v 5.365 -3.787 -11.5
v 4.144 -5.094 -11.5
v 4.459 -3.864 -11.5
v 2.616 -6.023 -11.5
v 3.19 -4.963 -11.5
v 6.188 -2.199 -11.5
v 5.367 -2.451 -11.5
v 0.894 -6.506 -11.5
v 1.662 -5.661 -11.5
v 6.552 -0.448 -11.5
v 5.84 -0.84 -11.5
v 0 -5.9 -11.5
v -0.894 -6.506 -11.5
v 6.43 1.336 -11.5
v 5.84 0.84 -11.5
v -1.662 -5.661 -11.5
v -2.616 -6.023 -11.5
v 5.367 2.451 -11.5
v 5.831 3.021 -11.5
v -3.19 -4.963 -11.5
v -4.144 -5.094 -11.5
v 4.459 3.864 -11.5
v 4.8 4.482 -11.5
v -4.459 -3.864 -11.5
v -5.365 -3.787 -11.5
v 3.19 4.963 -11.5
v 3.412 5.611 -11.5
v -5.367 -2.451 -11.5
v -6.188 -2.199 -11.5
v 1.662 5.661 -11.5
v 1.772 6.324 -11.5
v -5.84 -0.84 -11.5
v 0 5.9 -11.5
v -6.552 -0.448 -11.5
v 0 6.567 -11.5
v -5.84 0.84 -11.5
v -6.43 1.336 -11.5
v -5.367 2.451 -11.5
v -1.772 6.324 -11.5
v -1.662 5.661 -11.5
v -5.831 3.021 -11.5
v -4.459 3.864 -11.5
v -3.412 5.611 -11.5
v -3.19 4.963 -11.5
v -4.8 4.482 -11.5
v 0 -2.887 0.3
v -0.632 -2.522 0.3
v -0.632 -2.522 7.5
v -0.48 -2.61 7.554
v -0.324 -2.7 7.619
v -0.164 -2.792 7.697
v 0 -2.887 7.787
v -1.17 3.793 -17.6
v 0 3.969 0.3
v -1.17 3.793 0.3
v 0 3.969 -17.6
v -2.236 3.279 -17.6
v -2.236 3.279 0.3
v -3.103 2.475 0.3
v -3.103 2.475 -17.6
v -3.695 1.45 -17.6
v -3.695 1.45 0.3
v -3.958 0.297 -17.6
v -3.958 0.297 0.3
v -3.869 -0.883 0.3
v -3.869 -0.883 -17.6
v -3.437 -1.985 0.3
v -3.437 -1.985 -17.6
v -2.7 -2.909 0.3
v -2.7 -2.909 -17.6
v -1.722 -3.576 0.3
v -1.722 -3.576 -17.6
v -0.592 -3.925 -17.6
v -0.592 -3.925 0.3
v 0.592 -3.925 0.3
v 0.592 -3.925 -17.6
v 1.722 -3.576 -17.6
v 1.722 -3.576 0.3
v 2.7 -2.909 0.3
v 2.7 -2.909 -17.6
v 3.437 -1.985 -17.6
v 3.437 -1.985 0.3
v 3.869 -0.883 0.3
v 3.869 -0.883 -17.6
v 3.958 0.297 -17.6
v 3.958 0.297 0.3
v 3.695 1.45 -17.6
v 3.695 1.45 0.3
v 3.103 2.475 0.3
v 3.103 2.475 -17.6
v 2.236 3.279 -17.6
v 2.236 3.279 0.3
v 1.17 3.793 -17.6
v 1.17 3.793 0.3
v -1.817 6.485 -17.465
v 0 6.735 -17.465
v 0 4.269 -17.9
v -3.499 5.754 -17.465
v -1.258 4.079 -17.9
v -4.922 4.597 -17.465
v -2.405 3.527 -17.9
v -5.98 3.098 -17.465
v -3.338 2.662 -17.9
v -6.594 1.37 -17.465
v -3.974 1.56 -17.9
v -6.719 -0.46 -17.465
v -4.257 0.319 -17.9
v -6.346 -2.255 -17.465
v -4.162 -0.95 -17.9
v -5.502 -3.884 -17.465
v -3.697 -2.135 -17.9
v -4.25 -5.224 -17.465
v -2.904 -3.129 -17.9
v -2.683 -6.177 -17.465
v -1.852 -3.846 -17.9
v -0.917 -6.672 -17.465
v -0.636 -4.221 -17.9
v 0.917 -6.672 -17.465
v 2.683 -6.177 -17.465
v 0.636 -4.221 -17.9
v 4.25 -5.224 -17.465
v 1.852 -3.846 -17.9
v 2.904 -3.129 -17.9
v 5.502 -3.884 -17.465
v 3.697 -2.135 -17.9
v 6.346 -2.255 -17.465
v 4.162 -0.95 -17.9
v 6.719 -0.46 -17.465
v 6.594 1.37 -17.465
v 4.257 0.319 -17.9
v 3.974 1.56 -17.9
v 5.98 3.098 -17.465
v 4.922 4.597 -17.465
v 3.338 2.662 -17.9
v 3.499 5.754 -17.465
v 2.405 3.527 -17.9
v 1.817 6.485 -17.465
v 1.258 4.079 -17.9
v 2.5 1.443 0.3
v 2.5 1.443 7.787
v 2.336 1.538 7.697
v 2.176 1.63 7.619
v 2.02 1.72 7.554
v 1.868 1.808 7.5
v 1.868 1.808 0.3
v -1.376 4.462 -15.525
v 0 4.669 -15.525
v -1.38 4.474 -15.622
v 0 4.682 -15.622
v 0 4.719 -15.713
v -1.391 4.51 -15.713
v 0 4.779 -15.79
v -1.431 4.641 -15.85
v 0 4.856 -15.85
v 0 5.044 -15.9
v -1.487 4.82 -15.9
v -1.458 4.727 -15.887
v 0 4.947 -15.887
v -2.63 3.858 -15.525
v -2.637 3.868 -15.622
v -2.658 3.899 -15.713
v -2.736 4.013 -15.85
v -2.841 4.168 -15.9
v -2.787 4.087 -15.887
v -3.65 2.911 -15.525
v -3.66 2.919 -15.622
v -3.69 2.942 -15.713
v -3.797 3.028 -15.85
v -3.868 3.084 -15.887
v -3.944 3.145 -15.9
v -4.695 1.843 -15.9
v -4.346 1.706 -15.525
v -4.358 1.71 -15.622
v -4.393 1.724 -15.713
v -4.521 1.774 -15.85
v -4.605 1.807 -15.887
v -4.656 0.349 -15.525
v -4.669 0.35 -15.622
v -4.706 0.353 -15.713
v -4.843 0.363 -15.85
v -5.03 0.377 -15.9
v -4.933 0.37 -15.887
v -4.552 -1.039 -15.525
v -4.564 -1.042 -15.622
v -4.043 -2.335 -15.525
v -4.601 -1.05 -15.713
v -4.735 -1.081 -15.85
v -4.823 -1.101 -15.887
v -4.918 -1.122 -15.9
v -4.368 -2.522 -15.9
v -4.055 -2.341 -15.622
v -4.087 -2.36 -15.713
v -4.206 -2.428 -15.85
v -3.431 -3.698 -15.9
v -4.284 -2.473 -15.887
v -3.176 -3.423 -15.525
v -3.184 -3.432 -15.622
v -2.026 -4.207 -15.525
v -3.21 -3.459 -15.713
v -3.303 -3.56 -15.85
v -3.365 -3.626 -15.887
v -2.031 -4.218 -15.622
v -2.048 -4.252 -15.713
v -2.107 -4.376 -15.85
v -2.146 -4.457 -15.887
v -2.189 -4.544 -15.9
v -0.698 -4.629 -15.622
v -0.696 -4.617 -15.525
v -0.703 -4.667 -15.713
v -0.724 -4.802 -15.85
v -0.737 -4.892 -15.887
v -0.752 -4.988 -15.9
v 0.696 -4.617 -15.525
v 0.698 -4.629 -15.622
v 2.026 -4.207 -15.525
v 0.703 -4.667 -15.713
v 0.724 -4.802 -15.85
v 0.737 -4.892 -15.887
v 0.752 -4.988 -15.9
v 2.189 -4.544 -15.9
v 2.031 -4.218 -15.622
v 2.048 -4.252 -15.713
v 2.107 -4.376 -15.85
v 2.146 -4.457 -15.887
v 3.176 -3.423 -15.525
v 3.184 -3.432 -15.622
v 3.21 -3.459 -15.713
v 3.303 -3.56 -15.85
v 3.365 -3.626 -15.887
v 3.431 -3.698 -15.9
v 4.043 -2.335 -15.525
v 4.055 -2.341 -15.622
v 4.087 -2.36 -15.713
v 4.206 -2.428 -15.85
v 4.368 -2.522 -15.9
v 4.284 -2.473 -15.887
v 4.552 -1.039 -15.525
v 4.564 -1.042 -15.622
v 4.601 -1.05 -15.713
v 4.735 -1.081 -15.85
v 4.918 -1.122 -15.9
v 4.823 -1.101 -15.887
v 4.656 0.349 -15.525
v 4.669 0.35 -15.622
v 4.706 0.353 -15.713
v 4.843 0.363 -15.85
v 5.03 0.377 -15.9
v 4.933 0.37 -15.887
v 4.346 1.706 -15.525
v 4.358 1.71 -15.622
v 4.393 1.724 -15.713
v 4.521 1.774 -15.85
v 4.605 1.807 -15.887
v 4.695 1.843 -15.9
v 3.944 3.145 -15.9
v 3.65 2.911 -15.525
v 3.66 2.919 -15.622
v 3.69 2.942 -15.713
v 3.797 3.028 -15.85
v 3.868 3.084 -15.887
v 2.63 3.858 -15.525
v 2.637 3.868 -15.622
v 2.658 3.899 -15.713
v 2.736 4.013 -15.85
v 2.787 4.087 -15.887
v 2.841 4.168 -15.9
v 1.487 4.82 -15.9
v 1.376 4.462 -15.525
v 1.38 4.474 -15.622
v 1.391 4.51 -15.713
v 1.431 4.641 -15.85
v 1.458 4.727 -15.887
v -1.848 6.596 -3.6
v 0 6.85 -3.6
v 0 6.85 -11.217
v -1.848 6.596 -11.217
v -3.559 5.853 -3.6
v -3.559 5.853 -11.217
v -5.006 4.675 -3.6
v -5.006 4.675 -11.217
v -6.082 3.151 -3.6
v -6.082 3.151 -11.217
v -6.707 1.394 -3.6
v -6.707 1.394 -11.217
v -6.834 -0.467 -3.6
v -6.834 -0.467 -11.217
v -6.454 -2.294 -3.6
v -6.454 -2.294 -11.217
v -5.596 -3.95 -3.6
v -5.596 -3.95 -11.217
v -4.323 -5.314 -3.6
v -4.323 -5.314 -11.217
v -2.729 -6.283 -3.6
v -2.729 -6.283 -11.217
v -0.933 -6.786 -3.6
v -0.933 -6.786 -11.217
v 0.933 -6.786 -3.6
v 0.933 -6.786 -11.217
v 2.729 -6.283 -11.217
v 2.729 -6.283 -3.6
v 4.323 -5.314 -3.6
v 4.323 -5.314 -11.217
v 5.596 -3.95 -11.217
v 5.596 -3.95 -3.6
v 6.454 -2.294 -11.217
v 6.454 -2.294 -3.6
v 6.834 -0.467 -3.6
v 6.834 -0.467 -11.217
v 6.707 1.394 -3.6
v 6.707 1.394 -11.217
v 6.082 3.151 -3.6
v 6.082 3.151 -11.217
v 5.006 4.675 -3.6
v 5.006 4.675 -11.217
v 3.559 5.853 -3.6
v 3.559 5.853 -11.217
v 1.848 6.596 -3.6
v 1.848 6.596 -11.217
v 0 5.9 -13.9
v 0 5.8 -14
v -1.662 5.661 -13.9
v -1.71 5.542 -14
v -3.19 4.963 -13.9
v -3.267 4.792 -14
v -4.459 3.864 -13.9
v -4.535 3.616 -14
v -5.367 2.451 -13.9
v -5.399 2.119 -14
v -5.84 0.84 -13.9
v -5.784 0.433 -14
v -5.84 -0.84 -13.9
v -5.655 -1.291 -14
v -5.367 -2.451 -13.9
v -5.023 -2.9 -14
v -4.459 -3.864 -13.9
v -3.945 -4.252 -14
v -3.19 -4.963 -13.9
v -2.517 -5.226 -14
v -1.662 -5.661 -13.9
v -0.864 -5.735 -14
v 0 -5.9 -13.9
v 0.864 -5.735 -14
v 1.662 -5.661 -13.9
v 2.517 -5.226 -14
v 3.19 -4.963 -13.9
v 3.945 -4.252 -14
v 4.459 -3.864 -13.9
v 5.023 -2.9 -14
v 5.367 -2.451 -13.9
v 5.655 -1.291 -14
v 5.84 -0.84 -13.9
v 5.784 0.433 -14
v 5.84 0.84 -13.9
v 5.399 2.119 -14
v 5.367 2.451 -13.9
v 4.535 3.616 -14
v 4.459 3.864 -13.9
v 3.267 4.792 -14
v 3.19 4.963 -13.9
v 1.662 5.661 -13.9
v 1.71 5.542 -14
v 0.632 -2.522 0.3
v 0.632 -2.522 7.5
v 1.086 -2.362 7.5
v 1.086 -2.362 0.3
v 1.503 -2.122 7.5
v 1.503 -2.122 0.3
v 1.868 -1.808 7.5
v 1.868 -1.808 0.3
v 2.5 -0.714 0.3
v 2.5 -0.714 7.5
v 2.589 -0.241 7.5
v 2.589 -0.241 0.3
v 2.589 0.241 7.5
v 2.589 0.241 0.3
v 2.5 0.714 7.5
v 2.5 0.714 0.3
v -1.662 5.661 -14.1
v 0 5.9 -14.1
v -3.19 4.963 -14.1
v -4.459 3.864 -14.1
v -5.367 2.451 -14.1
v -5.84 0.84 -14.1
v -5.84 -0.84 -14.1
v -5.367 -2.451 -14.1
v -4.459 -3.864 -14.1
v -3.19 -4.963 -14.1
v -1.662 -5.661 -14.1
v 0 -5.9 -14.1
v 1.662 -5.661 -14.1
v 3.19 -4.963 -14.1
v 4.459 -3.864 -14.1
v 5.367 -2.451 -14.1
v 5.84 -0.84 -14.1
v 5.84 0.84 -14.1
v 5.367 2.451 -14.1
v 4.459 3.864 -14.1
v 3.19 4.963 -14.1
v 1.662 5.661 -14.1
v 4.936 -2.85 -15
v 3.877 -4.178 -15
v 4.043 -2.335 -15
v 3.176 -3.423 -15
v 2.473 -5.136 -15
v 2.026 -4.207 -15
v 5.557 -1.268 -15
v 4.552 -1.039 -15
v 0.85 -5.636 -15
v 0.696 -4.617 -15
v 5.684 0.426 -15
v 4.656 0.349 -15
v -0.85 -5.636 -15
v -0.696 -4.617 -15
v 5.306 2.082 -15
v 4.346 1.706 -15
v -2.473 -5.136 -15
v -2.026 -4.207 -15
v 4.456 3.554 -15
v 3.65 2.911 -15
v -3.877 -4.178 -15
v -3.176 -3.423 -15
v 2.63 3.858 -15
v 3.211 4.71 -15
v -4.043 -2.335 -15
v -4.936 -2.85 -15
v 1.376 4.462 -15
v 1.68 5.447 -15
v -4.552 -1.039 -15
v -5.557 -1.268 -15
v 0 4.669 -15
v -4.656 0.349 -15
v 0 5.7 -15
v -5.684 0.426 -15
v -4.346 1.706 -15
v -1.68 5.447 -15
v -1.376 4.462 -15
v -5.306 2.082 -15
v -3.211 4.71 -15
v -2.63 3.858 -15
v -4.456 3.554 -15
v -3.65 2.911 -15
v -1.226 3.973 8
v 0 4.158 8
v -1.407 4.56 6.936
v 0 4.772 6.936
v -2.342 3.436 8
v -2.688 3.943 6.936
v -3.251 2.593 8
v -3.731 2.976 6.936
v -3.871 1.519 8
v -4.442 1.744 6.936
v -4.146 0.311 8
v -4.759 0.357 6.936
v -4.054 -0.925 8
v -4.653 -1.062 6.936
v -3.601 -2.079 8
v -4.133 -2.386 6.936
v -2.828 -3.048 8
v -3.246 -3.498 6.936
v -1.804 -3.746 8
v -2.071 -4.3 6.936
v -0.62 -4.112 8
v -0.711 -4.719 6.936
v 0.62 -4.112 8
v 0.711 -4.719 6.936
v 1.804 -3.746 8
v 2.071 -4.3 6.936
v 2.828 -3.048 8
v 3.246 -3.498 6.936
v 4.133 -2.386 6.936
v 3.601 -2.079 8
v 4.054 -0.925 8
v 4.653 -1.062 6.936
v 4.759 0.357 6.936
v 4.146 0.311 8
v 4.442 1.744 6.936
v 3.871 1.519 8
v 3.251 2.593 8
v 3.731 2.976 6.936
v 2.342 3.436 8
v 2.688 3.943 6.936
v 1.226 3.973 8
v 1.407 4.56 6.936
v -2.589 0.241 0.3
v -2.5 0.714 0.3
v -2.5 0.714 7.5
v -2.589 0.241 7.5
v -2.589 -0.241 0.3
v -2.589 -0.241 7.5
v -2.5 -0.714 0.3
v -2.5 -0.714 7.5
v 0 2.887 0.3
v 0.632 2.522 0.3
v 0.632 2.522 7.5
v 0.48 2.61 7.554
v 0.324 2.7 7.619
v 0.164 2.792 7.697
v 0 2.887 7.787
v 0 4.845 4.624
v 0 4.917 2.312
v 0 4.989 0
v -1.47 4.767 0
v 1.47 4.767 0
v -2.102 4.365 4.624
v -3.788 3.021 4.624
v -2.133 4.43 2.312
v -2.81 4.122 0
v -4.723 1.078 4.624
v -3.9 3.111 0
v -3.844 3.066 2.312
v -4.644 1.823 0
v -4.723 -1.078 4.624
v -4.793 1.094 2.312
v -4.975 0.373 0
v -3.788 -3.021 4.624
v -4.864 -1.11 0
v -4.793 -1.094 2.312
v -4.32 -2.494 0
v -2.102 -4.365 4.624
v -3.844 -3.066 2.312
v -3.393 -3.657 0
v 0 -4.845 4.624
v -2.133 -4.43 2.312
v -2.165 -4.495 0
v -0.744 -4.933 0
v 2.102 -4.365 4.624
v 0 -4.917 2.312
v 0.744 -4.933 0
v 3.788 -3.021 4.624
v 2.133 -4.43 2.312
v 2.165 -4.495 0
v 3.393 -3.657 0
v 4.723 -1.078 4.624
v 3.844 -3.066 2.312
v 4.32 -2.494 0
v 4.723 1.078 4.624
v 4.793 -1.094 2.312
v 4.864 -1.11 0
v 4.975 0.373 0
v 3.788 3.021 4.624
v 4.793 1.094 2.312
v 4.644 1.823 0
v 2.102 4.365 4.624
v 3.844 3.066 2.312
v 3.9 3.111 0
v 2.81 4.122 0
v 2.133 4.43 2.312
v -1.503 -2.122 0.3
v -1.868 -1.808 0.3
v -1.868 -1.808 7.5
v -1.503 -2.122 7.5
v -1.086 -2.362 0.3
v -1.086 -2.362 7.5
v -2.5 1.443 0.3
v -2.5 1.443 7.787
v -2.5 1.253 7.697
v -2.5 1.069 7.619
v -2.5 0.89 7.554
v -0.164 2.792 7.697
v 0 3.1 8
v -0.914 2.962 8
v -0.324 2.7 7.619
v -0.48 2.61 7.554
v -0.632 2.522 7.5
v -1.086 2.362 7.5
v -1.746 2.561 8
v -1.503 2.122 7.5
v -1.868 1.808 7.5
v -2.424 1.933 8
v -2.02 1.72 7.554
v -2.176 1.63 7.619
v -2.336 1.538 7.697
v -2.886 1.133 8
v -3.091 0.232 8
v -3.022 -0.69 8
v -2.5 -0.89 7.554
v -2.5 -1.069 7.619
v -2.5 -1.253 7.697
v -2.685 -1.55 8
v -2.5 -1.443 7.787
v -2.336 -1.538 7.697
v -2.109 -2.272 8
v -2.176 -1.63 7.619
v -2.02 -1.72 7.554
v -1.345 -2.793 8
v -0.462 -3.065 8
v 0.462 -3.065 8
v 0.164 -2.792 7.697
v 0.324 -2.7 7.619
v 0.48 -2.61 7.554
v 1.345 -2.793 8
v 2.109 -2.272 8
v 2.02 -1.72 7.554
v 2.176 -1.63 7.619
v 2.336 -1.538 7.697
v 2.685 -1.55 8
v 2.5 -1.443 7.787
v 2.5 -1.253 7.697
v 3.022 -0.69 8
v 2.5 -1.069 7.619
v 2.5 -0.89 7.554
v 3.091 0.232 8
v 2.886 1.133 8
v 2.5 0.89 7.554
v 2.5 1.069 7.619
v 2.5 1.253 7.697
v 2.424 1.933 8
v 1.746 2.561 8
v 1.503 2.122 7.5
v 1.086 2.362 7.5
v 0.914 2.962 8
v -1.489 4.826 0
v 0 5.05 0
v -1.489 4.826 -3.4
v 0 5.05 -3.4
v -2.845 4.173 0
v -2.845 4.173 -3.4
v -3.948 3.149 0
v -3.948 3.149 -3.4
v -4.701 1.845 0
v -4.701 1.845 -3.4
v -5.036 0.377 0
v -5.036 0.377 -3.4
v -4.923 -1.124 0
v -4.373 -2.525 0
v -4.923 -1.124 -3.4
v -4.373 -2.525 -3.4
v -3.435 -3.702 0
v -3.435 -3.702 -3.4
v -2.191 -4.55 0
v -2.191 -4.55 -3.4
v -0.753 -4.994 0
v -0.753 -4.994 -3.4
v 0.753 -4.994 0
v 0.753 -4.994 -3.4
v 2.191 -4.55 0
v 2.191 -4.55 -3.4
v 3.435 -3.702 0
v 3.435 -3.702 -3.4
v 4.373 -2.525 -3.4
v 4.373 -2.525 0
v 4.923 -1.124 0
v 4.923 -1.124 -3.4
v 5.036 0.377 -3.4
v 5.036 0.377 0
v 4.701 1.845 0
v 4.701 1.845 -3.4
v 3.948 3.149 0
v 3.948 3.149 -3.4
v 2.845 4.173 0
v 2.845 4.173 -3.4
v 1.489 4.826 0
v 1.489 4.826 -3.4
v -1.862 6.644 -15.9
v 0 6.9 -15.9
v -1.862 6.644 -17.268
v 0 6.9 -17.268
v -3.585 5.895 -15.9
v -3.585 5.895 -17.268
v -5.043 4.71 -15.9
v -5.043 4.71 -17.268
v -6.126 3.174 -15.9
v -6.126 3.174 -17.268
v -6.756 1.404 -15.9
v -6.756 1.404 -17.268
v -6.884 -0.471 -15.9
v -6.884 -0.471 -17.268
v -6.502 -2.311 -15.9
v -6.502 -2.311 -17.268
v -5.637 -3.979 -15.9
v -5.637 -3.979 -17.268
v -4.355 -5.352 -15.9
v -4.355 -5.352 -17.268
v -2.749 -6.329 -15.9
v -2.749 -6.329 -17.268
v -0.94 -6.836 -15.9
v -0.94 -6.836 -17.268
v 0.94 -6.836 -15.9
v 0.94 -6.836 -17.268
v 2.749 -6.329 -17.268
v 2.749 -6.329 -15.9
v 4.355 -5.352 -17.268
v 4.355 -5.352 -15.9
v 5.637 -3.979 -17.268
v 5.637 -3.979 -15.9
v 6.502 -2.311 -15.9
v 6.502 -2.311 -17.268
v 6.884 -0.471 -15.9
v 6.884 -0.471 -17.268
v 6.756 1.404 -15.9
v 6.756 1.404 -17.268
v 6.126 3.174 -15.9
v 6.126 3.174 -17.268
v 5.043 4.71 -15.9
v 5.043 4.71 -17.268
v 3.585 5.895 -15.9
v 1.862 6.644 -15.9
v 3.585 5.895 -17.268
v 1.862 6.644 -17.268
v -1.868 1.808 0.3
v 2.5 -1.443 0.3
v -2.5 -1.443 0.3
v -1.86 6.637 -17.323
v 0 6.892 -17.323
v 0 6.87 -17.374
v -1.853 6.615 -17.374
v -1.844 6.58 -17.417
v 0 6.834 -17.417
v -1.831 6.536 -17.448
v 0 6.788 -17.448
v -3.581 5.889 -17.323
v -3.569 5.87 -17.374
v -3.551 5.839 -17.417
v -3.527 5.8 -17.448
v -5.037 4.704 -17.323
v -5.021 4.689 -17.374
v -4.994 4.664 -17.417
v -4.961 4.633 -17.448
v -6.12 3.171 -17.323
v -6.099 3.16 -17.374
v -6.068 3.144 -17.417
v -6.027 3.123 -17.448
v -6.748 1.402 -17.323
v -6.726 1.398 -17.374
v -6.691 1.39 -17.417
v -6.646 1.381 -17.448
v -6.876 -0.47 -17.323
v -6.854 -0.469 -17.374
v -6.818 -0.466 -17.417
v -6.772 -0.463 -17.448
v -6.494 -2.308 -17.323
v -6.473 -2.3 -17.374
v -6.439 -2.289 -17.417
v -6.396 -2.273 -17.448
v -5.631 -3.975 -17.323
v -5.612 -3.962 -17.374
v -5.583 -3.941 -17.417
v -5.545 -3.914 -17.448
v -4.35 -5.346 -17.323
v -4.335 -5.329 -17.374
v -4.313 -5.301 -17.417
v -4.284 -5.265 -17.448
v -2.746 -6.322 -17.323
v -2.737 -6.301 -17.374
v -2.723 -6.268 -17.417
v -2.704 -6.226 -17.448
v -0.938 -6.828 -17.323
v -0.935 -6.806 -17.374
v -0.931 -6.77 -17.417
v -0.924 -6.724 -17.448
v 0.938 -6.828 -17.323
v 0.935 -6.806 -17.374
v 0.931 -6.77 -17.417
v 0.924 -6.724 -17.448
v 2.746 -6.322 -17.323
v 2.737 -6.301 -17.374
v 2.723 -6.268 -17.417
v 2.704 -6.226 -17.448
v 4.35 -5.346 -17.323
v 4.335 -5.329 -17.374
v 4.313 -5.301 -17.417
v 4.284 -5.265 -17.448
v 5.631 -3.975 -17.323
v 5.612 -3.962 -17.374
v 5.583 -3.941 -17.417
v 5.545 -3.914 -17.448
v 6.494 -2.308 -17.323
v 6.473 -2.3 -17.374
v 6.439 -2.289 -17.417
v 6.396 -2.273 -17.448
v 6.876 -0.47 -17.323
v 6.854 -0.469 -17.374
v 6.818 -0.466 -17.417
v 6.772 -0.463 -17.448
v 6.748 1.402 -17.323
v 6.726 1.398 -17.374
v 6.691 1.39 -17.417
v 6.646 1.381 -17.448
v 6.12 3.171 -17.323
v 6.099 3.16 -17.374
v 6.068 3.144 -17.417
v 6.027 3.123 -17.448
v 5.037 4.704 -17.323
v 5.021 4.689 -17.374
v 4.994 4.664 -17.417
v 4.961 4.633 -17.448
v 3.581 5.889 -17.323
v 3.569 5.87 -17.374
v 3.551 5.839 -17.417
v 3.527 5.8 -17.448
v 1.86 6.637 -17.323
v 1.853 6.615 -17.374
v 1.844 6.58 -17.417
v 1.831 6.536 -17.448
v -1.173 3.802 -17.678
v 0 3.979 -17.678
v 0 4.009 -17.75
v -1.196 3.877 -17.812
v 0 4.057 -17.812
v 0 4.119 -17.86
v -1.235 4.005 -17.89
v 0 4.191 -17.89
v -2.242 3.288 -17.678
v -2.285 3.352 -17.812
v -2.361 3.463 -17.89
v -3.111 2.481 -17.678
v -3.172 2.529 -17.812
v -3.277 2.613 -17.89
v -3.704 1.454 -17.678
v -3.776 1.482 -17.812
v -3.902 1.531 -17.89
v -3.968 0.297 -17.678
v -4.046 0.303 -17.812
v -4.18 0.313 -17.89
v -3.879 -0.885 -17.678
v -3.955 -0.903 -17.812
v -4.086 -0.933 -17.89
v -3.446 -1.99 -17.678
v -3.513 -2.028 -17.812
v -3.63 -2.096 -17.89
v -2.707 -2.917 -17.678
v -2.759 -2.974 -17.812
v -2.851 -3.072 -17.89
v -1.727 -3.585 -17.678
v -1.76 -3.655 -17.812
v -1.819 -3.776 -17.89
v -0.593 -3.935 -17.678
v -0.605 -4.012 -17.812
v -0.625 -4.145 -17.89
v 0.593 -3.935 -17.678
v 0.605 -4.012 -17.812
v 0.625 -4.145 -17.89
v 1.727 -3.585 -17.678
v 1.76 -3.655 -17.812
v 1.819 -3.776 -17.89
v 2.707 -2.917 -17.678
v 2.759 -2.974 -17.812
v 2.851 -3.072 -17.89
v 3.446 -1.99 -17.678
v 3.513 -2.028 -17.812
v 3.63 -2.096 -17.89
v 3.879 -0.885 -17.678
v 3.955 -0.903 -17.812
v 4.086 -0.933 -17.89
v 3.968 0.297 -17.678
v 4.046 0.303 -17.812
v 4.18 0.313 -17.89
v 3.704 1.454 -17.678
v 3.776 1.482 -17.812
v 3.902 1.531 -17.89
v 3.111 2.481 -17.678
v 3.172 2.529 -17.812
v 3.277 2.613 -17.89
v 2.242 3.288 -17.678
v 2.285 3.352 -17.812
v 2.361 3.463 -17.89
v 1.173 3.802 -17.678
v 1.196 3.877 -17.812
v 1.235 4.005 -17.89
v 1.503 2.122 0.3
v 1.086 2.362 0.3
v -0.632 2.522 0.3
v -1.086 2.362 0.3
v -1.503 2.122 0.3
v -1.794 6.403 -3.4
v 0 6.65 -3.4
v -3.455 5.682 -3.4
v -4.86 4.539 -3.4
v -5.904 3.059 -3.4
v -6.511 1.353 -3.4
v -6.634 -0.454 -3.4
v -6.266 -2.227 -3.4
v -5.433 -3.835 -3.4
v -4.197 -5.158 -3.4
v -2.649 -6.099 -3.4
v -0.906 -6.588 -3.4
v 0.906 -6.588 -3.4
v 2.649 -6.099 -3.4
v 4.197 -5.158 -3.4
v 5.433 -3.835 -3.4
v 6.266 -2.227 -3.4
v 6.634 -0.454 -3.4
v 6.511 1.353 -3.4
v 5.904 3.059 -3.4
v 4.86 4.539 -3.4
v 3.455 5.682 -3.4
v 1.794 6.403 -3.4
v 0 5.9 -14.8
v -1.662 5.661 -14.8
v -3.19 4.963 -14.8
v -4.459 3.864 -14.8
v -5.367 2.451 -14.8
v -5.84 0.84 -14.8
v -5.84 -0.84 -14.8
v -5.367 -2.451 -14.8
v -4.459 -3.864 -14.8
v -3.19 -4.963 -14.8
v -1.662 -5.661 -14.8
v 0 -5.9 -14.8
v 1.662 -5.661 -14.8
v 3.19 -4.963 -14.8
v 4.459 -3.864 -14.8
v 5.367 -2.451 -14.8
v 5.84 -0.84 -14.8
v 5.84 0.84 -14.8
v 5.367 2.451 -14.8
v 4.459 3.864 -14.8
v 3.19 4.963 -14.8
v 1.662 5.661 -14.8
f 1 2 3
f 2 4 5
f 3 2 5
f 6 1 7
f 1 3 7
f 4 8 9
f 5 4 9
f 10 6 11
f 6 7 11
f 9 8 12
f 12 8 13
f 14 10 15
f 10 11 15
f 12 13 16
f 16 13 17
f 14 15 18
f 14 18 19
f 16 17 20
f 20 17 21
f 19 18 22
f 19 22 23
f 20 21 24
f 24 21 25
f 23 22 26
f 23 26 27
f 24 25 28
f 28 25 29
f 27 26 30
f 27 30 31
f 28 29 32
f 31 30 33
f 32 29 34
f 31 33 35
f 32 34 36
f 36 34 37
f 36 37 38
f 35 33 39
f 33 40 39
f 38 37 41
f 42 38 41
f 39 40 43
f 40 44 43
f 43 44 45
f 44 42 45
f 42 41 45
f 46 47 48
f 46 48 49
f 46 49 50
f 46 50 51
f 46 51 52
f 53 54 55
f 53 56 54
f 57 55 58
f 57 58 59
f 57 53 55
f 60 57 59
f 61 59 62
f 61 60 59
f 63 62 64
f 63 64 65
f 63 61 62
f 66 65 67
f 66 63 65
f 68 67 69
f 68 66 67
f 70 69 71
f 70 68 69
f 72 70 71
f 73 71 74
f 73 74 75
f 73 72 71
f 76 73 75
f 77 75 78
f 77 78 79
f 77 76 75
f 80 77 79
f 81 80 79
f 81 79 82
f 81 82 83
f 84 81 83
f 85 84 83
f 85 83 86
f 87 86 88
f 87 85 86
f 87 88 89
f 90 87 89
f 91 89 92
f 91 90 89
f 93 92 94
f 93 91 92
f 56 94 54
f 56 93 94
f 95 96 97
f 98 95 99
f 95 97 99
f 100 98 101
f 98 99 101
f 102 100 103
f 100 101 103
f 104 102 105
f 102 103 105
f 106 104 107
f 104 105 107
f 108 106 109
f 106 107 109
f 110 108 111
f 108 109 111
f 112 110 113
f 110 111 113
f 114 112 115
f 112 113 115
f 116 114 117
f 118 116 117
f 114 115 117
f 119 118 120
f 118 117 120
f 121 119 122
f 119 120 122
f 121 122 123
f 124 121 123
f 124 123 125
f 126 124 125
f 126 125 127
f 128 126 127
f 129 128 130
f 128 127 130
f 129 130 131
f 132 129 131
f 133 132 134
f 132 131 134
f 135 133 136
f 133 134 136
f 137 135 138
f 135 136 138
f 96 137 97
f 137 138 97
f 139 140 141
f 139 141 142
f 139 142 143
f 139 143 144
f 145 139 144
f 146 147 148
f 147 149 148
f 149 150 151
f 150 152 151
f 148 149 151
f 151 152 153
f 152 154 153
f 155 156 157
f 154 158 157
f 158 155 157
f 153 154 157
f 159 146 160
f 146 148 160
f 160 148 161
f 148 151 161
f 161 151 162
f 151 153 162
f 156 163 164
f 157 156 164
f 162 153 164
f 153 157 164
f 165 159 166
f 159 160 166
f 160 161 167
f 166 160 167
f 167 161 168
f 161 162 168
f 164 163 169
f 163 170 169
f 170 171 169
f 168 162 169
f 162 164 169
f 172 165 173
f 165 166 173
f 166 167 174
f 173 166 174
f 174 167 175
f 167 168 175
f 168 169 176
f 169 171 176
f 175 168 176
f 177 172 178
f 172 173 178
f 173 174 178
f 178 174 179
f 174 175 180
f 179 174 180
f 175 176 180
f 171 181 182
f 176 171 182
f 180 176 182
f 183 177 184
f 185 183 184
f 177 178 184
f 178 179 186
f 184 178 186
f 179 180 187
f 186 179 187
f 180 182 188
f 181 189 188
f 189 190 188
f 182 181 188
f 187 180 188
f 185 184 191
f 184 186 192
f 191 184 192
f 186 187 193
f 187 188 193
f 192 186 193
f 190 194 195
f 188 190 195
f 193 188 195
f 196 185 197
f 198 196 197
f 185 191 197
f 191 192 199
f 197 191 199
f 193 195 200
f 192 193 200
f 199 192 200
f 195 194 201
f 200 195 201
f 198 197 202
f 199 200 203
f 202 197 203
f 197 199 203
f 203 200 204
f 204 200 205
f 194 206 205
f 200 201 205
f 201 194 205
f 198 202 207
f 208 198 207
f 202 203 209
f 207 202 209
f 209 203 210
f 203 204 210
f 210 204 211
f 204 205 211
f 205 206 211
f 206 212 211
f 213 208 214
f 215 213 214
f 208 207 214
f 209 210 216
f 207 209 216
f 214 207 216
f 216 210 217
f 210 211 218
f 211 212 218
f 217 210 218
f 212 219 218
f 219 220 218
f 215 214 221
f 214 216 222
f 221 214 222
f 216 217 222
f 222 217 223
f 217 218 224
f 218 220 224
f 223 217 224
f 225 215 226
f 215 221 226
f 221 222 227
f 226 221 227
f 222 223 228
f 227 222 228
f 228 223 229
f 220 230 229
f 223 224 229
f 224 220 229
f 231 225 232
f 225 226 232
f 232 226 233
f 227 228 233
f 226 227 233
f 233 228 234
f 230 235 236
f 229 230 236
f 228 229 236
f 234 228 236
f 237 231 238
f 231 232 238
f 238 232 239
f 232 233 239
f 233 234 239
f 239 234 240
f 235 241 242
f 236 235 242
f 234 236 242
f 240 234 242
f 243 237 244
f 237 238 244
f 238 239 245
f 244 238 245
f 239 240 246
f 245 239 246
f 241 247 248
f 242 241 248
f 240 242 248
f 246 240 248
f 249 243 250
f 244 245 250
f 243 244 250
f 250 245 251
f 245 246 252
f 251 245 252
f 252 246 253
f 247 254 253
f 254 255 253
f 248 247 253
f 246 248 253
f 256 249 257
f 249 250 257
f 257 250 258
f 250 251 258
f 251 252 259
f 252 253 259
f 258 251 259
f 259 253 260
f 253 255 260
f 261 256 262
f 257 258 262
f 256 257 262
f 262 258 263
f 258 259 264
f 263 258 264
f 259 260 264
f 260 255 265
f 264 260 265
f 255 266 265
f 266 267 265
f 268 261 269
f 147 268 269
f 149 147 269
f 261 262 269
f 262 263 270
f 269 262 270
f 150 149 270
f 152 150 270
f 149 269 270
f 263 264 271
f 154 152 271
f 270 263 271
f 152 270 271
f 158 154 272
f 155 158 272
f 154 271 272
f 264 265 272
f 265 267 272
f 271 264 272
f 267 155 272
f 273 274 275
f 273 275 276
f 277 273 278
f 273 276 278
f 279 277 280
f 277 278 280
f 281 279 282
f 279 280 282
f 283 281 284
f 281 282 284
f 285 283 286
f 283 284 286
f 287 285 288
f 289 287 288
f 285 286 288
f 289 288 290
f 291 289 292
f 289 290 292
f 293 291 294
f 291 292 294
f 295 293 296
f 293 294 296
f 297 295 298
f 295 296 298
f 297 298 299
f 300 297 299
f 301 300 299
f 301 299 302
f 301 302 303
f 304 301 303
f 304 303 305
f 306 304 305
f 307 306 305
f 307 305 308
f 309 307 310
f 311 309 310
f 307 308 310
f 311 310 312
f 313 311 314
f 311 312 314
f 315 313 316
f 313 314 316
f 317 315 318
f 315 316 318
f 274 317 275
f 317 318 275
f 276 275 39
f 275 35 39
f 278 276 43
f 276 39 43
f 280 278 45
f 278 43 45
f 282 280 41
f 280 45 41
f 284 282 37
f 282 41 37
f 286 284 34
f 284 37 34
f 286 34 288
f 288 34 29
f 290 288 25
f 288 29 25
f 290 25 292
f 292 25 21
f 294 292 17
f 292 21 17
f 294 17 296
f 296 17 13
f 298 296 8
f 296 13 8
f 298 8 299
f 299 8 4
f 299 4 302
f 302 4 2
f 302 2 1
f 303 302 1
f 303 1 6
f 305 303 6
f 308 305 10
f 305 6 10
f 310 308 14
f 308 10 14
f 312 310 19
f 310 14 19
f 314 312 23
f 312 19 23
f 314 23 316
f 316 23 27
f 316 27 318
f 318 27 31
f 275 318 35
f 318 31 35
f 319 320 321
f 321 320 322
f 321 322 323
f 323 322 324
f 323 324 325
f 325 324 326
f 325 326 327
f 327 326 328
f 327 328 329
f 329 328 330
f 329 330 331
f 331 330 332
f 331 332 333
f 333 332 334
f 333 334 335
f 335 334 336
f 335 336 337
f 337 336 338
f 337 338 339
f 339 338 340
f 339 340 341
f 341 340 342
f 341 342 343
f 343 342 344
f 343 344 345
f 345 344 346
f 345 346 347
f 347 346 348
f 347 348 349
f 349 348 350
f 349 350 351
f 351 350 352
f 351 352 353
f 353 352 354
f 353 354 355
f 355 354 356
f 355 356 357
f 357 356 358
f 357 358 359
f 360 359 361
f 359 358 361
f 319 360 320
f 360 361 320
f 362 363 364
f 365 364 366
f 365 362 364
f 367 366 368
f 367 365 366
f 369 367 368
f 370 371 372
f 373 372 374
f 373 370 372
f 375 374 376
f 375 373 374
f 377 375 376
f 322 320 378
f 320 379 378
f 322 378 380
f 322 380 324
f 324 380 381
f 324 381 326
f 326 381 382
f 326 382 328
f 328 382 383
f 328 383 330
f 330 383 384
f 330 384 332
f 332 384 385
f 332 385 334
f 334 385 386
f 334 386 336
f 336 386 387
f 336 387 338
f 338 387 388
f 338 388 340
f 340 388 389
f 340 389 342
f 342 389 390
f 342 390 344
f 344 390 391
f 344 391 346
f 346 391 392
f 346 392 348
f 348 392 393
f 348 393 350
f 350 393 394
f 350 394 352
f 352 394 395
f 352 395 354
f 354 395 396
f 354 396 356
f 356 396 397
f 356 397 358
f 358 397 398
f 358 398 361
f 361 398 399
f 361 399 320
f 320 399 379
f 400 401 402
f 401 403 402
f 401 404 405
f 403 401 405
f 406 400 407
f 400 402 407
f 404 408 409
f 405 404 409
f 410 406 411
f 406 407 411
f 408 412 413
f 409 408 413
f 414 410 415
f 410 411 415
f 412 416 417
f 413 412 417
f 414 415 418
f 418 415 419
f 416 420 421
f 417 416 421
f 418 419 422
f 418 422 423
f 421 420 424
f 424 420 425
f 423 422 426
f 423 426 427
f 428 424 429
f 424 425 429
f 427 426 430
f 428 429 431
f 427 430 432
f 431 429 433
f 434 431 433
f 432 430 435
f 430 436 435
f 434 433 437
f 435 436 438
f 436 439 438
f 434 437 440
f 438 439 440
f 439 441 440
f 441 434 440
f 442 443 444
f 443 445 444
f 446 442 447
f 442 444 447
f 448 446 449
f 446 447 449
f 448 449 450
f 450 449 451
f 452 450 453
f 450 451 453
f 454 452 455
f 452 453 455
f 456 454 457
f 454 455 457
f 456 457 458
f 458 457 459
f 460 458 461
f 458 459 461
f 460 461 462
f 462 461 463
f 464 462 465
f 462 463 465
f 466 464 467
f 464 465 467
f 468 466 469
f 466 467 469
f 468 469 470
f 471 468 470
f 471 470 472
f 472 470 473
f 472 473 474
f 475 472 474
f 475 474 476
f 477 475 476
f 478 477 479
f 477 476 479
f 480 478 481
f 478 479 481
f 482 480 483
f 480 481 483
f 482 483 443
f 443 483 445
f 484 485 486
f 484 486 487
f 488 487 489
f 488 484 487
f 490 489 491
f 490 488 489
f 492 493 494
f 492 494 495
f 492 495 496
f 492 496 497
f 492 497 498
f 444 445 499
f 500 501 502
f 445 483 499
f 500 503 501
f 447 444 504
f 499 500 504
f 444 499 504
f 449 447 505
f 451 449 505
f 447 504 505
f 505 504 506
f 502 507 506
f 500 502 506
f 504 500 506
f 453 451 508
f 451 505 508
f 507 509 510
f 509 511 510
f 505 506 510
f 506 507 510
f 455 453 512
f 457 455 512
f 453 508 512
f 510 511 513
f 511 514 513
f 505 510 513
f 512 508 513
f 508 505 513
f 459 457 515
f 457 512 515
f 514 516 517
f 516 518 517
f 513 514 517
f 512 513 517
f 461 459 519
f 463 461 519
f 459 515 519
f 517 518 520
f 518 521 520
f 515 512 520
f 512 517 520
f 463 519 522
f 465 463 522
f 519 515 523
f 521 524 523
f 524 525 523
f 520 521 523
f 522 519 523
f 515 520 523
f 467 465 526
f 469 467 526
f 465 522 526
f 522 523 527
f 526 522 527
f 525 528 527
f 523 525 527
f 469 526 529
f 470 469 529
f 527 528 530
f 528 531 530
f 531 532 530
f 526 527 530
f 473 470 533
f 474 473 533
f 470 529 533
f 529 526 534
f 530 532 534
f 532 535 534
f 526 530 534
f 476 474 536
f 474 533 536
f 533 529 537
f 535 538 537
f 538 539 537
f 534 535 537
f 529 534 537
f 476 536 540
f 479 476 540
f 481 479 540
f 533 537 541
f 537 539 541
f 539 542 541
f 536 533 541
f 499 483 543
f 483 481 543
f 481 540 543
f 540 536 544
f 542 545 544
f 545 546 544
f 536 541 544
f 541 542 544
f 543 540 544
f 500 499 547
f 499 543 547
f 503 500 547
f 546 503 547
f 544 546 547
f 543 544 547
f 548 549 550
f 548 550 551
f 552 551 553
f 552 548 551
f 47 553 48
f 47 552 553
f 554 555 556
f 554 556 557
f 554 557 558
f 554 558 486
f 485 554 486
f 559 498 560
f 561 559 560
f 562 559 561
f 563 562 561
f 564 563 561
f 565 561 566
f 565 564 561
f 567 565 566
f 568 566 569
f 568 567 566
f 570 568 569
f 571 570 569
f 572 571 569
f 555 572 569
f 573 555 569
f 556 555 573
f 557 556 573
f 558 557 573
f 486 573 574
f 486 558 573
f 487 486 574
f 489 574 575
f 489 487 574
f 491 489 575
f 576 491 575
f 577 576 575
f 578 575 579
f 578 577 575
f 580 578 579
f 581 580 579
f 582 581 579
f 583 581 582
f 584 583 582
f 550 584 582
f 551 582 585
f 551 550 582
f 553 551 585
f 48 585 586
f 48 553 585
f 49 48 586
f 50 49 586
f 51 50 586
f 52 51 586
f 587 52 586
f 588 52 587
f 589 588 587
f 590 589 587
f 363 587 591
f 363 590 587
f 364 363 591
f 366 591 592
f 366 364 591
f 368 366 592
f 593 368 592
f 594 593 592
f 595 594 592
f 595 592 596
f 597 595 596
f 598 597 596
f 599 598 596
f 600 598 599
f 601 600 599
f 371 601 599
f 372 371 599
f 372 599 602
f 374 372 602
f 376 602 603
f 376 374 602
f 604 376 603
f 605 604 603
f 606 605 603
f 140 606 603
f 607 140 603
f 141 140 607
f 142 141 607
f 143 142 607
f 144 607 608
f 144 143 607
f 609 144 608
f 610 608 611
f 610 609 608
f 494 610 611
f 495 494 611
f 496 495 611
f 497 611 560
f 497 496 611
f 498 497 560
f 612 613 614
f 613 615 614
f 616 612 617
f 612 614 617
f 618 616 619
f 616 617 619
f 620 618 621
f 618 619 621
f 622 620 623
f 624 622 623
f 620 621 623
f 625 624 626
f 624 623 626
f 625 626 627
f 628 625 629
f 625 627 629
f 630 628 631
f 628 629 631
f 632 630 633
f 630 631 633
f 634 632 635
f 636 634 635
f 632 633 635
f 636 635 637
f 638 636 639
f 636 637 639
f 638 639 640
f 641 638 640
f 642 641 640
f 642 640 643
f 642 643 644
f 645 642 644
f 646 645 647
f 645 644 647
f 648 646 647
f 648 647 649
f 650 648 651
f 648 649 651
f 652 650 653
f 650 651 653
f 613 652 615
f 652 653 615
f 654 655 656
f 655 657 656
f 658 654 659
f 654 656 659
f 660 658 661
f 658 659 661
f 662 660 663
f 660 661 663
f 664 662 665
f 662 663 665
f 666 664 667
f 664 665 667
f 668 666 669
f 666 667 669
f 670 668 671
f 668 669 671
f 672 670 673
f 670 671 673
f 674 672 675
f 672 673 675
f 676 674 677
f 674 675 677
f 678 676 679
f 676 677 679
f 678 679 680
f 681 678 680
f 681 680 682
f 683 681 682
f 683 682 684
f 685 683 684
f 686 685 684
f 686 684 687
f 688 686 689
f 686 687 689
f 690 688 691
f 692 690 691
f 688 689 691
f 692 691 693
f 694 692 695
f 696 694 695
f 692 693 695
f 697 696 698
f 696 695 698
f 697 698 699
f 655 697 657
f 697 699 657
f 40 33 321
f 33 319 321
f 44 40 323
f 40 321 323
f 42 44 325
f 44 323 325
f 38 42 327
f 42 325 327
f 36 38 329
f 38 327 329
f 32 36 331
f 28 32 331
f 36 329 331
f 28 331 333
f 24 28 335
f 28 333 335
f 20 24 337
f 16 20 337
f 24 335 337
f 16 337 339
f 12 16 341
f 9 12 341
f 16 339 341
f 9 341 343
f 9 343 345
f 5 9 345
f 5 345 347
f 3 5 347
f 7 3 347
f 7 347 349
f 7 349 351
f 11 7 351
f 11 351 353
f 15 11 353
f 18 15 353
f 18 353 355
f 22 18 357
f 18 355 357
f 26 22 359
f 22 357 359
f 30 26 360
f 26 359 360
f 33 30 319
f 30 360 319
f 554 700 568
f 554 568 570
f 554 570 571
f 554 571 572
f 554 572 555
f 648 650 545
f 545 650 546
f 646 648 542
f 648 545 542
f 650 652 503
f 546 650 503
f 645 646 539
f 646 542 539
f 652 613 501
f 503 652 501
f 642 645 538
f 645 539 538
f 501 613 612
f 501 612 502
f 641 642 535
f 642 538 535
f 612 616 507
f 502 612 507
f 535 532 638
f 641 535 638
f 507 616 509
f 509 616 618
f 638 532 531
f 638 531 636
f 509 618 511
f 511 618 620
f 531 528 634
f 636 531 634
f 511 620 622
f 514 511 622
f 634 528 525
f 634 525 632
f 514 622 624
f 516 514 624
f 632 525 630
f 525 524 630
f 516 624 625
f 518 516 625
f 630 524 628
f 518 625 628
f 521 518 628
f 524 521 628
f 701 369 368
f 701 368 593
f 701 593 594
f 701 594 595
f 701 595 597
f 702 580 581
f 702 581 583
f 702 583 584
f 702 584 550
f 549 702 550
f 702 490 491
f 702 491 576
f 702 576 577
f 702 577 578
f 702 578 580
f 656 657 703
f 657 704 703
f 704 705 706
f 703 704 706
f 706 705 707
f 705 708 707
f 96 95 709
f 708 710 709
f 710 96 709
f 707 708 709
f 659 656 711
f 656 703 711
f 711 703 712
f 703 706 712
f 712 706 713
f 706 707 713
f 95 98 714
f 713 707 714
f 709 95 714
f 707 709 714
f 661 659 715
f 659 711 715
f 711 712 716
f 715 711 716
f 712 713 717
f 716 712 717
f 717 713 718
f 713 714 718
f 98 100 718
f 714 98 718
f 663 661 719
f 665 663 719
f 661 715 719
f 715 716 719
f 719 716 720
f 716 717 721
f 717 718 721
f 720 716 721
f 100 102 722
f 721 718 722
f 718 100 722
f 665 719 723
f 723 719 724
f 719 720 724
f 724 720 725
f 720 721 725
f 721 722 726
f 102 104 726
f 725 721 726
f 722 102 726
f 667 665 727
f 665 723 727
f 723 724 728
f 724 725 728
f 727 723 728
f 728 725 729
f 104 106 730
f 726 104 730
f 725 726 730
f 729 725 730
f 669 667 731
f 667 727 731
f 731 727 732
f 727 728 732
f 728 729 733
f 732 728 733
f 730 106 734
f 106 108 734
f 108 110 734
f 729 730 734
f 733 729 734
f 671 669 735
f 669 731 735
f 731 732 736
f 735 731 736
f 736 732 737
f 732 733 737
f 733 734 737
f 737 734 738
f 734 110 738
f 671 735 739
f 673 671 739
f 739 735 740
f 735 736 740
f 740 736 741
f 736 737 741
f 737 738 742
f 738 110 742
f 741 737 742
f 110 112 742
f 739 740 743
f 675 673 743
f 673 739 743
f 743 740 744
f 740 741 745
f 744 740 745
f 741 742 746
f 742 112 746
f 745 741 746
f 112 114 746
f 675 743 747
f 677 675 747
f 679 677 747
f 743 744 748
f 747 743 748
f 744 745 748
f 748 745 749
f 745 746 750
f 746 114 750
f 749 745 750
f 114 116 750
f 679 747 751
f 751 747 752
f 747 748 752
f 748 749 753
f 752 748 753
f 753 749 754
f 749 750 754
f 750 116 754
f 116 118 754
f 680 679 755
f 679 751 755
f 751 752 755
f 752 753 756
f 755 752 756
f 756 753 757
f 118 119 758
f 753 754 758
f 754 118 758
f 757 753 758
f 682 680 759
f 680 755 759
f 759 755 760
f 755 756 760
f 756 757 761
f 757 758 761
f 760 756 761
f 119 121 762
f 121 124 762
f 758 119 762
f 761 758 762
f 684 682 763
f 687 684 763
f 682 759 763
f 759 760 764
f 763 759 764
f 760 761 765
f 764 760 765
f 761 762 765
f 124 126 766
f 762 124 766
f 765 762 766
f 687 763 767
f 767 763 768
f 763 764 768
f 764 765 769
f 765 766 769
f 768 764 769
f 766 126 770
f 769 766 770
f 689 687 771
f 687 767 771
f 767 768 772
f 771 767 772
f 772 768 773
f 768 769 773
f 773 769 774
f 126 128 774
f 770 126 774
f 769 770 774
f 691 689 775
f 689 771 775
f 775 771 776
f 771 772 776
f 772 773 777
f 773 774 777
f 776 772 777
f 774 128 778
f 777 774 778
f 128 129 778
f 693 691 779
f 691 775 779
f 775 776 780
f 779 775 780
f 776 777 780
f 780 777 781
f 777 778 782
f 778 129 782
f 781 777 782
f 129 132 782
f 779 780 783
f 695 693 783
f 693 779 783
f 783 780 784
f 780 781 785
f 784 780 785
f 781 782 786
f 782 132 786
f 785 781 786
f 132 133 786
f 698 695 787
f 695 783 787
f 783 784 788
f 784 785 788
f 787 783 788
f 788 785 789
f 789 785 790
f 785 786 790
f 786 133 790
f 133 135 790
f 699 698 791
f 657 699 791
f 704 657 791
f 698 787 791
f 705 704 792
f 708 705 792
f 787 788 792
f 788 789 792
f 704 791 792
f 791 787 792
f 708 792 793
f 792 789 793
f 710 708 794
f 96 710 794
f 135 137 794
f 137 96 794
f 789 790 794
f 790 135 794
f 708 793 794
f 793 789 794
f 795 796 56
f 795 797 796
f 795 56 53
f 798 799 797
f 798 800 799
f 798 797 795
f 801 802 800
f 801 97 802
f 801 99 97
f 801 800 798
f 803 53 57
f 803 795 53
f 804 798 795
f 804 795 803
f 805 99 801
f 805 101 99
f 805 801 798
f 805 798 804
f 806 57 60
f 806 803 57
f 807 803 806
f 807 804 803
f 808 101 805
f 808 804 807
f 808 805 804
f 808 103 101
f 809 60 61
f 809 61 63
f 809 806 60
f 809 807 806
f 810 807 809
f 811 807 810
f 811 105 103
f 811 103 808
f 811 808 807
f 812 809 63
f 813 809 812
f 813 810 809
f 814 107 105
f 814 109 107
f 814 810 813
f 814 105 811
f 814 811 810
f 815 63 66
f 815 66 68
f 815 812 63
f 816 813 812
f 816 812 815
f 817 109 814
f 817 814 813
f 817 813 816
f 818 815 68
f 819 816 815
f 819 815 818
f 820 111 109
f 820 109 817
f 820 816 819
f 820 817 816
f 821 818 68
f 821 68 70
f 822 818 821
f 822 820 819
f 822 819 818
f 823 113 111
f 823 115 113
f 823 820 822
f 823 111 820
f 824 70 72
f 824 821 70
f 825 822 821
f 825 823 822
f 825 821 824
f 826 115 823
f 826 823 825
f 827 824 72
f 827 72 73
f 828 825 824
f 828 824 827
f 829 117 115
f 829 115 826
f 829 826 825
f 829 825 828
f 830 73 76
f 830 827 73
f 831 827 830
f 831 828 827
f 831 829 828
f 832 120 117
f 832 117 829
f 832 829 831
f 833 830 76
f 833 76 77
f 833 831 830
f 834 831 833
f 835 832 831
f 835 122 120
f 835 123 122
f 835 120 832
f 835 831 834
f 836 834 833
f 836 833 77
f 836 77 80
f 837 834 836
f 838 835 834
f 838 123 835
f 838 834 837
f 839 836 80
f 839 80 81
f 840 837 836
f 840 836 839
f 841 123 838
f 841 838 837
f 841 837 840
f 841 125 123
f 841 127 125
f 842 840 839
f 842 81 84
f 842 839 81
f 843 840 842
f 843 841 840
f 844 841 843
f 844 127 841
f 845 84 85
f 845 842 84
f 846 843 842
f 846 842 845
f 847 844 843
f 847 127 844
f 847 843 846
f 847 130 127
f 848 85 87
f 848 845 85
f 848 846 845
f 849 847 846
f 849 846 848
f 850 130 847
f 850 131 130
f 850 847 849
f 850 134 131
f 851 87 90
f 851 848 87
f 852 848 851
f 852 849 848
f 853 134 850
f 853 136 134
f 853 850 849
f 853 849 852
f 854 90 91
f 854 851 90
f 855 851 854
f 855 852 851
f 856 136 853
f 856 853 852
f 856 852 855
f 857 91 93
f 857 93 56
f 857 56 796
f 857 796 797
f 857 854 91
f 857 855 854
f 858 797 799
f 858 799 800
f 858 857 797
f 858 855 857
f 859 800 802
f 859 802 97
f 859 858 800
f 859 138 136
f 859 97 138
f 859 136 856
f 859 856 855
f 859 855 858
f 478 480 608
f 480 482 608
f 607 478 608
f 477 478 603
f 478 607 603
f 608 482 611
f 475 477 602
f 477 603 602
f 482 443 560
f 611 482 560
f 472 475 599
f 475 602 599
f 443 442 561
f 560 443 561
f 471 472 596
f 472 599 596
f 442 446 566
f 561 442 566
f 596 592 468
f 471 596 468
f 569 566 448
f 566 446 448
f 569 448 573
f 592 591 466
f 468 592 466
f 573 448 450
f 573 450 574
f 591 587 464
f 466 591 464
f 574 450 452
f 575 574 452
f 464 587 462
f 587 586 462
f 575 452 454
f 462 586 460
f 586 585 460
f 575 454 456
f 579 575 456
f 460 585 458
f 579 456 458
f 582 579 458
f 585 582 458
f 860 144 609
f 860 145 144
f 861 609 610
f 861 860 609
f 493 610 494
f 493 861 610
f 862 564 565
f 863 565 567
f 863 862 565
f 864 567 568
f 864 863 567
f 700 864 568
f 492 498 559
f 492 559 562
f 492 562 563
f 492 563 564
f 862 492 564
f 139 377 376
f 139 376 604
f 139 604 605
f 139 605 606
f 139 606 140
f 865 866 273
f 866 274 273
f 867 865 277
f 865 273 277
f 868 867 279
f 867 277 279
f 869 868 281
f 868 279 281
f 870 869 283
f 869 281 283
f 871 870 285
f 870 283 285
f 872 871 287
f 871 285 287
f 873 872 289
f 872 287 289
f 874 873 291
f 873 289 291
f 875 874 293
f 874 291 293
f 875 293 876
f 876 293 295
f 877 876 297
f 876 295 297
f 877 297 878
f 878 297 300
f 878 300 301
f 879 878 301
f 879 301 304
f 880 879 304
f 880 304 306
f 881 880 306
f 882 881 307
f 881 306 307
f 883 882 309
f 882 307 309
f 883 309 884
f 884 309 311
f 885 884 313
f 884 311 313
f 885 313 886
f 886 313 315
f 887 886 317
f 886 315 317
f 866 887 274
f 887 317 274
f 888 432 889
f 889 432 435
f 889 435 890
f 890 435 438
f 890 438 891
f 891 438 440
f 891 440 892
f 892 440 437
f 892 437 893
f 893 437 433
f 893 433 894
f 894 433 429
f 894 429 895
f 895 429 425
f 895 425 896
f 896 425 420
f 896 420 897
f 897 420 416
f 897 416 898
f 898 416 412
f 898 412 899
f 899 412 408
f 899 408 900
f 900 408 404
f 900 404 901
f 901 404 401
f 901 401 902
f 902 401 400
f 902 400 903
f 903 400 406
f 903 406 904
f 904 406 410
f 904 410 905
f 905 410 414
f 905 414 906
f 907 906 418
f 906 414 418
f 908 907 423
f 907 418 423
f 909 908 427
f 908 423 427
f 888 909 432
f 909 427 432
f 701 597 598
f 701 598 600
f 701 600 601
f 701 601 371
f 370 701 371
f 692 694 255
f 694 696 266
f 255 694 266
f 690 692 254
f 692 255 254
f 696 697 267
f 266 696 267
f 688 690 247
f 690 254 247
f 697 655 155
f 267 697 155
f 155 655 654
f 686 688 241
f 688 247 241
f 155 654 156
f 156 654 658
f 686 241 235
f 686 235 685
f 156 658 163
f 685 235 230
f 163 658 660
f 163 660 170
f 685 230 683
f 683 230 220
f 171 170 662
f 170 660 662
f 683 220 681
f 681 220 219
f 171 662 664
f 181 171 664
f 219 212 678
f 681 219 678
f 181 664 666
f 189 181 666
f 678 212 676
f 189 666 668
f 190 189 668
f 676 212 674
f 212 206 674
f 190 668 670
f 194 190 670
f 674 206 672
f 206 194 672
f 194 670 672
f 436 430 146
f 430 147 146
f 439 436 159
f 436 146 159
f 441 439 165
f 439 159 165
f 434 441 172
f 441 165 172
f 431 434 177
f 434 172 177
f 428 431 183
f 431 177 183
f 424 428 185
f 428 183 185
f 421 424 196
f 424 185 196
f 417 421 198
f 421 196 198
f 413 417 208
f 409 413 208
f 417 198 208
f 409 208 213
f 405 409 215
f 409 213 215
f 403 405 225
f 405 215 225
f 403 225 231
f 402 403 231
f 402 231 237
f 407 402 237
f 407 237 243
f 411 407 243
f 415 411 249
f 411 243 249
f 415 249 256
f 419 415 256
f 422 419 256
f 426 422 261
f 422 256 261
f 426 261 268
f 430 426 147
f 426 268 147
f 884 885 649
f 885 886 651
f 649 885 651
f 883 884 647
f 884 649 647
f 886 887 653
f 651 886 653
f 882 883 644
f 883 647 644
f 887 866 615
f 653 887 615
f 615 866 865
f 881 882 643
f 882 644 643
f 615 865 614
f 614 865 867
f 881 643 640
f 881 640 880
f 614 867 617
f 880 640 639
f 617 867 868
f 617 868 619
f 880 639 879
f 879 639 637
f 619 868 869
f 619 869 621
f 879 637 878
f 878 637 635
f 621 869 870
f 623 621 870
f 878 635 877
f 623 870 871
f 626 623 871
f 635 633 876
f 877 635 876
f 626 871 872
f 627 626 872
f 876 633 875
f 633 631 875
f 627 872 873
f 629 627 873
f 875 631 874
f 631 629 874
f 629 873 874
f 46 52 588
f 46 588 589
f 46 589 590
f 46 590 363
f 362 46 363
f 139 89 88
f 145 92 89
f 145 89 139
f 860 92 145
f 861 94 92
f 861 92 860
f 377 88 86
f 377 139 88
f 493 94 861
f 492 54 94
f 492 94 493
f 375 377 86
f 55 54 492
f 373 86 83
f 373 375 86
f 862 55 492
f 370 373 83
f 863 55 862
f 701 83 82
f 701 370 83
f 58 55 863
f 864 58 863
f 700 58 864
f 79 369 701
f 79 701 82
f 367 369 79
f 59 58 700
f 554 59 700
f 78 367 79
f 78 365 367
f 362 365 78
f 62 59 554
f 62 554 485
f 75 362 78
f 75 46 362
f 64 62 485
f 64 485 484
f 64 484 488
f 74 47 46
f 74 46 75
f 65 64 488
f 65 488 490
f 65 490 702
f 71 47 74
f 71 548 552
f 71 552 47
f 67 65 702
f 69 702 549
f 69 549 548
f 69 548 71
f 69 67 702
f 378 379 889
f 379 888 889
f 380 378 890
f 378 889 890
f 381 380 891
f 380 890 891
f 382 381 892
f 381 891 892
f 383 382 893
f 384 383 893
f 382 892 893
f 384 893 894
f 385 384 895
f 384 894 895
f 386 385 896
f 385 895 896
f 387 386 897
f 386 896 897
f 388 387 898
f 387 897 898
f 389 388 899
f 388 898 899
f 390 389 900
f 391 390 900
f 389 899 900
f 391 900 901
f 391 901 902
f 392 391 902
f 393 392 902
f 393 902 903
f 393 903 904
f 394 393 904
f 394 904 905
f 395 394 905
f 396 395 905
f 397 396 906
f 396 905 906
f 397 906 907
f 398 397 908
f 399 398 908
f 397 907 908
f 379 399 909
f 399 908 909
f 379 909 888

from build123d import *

# Parameters (mm, degrees)
CUT_EXTRUDE1_DEPTH = 7.7


with BuildPart() as part:
    # Sketch1 → Revolve1 (revolve)
    with BuildSketch(Plane(origin=(0, 0, 0), x_dir=(0, 0, -1), z_dir=(1, 0, 0))):
        with BuildLine():
            Line((0, 0), (0, 6.85))
            Line((0, 6.85), (11.217157288, 6.85))
            Line((11.217157288, 6.85), (11.5, 6.567157288))
            Line((11.5, 6.567157288), (11.5, 5.9))
            Line((11.5, 5.9), (13.9, 5.9))
            Line((13.9, 5.9), (14, 5.8))
            Line((14, 5.8), (14.1, 5.9))
            Line((14.1, 5.9), (14.8, 5.9))
            Line((14.8, 5.9), (15, 5.7))
            Line((15, 5.7), (15, 4.669))
            Line((15, 4.669), (15.525, 4.669))
            ThreePointArc((15.525, 4.669), (15.790165043, 4.778834957), (15.9, 5.044))
            Line((15.9, 5.044), (15.9, 6.9))
            Line((15.9, 6.9), (17.268263788, 6.9))
            ThreePointArc((17.268263788, 6.9), (17.396821309, 6.853208889), (17.465225338, 6.734729636))
            Line((17.465225338, 6.734729636), (17.9, 4.269))
            Line((17.9, 4.269), (17.9, 0))
            Line((17.9, 0), (0, 0))
        make_face()
    revolve(axis=Axis((0, 0, -17.9), (0, 0, 1)))

    # Sketch2 → Revolve2 (revolve)
    with BuildSketch(Plane(origin=(0, 0, 0), x_dir=(0, 0, -1), z_dir=(1, 0, 0))):
        Polygon((-8, 0), (-8, 4.158121832), (-6.93615215, 4.772334675), (0, 4.988878168), (0, 0), align=None)
    revolve(axis=Axis((0, 0, 0), (0, 0, 1)))

    # Sketch3 → Cut-Revolve1 (revolve, cut)
    with BuildSketch(Plane(origin=(0, 0, 0), x_dir=(0, 0, -1), z_dir=(1, 0, 0))):
        Polygon((0, 6.85), (0, 5.05), (3.4, 5.05), (3.4, 6.65), (3.6, 6.85), align=None)
    revolve(axis=Axis((0, 0, -50), (0, 0, 1)), mode=Mode.SUBTRACT)

    # Sketch4 → Cut-Revolve2 (revolve, cut)
    with BuildSketch(Plane(origin=(0, 0, 0), x_dir=(0, 0, -1), z_dir=(1, 0, 0))):
        with BuildLine():
            Line((-8, 0), (-8, 3.1))
            Line((-8, 3.1), (-7.5, 2.6))
            Line((-7.5, 2.6), (-0.3, 2.6))
            Line((-0.3, 2.6), (-0.3, 3.969))
            Line((-0.3, 3.969), (17.6, 3.969))
            ThreePointArc((17.6, 3.969), (17.812132034, 4.056867966), (17.9, 4.269))
            Line((17.9, 4.269), (17.9, 0))
            Line((17.9, 0), (-8, 0))
        make_face()
    revolve(axis=Axis((0, 0, -17.9), (0, 0, 1)), mode=Mode.SUBTRACT)

    # Sketch5 → Cut-Extrude1 (cut)
    with BuildSketch(Plane.XY.offset(0.3)):
        Polygon((-2.5, -1.443375673), (0, -2.886751346), (2.5, -1.443375673), (2.5, 1.443375673), (0, 2.886751346), (-2.5, 1.443375673), align=None)
    extrude(amount=CUT_EXTRUDE1_DEPTH, mode=Mode.SUBTRACT)


solid = part.part
